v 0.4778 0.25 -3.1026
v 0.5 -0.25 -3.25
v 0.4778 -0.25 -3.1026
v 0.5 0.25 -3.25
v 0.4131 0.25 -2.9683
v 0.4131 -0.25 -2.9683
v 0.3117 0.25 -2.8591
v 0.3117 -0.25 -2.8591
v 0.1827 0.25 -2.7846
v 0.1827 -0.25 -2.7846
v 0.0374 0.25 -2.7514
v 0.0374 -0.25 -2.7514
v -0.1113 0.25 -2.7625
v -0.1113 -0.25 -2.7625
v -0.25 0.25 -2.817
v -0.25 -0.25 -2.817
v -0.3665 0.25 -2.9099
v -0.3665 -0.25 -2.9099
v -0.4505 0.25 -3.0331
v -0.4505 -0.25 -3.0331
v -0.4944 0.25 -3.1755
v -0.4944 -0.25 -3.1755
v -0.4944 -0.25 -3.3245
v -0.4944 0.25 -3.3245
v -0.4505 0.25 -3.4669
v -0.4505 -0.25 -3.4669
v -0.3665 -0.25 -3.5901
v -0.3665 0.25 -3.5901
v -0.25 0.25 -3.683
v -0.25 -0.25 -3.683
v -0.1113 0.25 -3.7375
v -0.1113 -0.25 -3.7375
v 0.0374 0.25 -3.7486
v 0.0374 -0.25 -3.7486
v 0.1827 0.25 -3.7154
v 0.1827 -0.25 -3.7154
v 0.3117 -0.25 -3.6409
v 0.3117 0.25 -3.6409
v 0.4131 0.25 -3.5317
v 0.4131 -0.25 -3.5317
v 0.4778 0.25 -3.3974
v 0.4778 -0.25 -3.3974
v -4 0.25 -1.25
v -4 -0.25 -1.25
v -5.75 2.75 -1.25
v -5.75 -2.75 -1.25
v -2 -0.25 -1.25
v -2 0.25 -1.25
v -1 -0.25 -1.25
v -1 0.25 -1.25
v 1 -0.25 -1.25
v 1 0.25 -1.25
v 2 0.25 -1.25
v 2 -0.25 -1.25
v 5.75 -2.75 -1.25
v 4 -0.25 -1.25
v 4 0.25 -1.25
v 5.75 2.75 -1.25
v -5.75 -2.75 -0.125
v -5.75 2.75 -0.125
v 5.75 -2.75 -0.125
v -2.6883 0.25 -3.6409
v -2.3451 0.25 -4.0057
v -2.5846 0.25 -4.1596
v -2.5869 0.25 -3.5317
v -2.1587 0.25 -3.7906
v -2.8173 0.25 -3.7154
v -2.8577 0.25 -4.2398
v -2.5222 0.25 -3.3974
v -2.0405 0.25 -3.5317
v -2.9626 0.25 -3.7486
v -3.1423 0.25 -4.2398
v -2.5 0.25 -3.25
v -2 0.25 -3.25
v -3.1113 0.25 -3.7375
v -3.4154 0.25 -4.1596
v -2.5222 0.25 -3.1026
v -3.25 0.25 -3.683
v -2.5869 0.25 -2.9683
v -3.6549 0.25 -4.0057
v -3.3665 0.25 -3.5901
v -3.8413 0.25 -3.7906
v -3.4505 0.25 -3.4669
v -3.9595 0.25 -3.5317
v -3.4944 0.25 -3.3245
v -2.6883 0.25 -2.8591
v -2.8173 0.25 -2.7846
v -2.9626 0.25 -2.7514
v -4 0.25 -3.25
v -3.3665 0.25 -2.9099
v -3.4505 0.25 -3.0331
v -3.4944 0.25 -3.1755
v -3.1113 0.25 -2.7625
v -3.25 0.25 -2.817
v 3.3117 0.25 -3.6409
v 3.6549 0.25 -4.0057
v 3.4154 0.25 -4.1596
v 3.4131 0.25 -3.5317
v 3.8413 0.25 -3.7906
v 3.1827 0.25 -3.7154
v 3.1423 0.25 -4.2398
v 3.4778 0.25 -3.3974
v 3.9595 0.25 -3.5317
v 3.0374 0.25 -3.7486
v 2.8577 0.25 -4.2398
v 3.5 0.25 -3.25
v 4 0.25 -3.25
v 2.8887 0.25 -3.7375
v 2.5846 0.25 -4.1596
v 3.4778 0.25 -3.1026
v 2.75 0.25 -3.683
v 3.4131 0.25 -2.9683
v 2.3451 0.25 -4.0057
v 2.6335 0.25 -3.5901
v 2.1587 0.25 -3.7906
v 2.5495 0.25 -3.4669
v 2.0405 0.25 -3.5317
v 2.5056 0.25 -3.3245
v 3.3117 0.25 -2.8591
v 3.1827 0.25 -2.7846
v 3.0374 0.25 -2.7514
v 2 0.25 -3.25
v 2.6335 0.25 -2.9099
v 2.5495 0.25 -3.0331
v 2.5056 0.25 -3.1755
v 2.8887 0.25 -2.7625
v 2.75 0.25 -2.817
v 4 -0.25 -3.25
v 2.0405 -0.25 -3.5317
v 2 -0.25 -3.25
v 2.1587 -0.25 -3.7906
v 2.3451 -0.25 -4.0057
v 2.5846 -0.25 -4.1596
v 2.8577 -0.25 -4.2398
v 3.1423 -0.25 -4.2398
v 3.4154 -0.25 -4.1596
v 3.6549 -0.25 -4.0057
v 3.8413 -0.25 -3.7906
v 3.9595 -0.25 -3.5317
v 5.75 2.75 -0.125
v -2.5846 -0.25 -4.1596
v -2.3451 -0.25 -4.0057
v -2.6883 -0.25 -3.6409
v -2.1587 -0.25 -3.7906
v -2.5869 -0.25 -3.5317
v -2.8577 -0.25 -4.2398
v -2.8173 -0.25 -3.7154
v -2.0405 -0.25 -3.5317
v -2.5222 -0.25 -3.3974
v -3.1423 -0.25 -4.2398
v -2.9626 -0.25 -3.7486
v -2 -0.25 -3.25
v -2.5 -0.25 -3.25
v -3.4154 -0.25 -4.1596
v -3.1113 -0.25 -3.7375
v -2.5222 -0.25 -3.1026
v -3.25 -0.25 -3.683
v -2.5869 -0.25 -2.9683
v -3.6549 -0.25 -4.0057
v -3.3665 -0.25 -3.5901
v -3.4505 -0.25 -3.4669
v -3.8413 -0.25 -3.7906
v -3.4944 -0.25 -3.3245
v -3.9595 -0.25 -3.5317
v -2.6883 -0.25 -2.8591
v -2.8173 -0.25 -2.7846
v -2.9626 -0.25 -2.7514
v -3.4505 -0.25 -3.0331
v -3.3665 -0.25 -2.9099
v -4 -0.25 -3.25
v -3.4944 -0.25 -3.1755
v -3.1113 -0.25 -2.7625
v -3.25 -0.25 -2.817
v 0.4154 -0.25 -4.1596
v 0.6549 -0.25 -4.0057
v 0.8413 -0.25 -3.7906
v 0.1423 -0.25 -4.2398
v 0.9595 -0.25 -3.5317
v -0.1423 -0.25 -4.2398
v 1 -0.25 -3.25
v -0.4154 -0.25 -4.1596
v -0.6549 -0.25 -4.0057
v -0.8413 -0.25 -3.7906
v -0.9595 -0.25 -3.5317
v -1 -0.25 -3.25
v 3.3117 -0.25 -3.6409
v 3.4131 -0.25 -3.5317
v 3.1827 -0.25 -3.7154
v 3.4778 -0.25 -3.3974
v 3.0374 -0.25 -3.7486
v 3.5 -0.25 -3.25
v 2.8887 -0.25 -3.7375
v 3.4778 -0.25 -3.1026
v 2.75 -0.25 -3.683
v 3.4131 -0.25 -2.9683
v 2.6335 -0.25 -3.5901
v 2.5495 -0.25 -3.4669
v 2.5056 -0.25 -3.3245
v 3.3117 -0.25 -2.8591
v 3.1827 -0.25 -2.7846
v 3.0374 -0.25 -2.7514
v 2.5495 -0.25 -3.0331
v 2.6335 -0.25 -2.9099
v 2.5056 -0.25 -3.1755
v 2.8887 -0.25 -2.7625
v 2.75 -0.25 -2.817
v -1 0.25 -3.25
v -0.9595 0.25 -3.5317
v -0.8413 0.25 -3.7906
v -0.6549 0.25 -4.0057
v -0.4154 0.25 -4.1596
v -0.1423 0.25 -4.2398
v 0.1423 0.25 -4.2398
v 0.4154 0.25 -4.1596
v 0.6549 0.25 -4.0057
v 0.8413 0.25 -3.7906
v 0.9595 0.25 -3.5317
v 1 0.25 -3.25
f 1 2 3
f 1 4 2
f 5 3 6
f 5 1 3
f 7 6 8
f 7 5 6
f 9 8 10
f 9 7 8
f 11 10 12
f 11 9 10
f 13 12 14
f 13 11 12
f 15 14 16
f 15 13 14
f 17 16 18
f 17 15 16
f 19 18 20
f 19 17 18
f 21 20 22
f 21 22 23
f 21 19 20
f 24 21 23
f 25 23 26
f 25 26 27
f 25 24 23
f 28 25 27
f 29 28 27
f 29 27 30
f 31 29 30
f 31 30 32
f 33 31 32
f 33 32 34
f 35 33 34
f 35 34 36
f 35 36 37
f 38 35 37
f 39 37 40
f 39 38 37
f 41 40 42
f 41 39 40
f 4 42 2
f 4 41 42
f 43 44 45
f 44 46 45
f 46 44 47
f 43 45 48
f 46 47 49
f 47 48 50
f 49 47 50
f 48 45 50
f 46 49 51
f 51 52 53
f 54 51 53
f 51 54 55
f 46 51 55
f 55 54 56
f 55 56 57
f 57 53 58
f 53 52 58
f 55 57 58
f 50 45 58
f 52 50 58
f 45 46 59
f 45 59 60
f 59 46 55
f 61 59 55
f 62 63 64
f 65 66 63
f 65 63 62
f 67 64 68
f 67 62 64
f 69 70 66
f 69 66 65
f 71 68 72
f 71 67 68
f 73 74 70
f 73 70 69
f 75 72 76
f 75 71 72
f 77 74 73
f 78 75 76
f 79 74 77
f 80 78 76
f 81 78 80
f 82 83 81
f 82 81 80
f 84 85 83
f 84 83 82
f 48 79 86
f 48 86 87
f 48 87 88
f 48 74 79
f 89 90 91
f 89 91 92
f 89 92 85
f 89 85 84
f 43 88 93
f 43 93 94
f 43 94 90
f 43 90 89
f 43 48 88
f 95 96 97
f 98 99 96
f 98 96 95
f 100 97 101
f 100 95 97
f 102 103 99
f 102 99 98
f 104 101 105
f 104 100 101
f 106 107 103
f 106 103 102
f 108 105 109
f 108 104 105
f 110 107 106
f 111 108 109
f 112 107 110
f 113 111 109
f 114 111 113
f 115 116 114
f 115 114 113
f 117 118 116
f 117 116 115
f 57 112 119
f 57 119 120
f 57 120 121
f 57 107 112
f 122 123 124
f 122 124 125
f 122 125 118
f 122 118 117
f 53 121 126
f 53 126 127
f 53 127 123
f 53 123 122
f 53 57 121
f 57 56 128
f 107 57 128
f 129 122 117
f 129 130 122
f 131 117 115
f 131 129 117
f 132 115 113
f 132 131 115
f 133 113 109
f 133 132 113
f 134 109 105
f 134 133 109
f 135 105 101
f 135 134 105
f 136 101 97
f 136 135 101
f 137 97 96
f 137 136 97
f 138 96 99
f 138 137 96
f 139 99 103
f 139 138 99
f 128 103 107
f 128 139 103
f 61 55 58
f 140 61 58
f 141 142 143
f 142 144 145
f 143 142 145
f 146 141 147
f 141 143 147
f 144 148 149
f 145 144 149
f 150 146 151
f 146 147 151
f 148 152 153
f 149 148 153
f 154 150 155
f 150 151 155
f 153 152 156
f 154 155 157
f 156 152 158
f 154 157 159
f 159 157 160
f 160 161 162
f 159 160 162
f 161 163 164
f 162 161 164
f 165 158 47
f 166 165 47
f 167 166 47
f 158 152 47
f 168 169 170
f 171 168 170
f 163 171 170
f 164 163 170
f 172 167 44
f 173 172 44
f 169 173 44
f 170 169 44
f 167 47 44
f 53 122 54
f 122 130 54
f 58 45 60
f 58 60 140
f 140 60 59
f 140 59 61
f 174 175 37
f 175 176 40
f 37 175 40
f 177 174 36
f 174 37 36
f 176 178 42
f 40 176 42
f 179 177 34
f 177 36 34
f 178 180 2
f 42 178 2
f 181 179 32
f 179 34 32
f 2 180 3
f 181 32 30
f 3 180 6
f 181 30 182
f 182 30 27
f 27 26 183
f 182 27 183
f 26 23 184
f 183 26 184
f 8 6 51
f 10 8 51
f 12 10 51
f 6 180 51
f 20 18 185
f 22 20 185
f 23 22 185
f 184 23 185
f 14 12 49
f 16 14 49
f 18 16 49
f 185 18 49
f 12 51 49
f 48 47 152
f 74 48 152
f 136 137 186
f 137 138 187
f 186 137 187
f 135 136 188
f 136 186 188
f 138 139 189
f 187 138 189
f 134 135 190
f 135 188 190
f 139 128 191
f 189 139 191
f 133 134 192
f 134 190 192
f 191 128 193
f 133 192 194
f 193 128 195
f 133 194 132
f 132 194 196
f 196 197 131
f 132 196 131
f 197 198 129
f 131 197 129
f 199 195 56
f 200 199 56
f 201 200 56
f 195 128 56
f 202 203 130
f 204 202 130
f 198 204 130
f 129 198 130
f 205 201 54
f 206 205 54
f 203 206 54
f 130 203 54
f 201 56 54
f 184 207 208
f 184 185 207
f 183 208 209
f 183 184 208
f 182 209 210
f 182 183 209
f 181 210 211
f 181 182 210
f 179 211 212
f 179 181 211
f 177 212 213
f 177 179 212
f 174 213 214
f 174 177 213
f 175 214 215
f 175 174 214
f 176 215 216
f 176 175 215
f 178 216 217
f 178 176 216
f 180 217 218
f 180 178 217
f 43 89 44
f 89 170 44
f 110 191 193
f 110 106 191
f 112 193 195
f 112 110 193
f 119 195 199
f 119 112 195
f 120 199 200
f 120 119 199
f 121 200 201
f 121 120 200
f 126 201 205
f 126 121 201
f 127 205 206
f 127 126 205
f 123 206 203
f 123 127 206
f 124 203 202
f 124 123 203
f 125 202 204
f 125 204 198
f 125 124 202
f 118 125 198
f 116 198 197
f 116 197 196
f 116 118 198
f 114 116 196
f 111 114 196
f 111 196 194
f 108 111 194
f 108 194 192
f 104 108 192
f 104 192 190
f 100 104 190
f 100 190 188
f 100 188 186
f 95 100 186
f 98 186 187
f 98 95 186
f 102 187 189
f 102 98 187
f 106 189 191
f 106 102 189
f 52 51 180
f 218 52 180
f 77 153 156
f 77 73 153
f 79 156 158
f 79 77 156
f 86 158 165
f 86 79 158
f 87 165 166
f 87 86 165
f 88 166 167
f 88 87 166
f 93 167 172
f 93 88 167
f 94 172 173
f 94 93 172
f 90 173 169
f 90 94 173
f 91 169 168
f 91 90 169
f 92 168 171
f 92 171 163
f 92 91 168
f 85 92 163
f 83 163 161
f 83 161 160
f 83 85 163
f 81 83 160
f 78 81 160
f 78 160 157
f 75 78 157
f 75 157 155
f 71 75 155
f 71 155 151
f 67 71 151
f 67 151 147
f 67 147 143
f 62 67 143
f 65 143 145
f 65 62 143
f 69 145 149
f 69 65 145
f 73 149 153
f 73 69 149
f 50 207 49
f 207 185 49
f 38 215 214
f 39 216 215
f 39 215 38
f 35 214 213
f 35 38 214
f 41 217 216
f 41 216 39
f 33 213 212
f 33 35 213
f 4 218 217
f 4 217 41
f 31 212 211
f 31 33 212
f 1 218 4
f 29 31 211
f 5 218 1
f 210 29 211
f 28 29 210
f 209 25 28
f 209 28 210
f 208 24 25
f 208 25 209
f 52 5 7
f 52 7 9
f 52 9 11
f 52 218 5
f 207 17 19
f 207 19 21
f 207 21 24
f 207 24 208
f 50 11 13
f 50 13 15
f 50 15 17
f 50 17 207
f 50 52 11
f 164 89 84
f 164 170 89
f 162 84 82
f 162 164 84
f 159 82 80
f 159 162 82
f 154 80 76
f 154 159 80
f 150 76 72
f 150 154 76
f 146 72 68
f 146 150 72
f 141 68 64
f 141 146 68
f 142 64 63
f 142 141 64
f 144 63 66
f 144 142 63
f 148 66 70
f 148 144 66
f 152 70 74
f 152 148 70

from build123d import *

# Parameters (mm, degrees)
SKETCH006_R  = 0.5
PAD003_DEPTH = 0.25
BOX_W        = 11.5
BOX_H        = 5.5
BOX_DEPTH    = 1.125


with BuildPart() as pin_pad:
    # Sketch006 → Pad003 (new body, symmetric)
    with BuildSketch(Plane.XZ):
        with BuildLine():
            Line((1, -1.25), (1, -3.25))
            ThreePointArc((-1, -3.25), (0, -4.25), (1, -3.25))
            Line((-1, -3.25), (-1, -1.25))
            Line((-1, -1.25), (1, -1.25))
        make_face()
        with Locations((0, -3.25)):
            Circle(SKETCH006_R, mode=Mode.SUBTRACT)
    extrude(amount=PAD003_DEPTH, both=True)


with BuildPart() as pin_right:
    # Clone base: copy of pin-pad
    add(pin_pad.part)


with BuildPart() as pin_right_1:
    # Clone placement: moved
    add(pin_right.part.moved(Location((3, 0, 0))))


with BuildPart() as pin_left:
    # Clone001 base: copy of pin-pad
    add(pin_pad.part)


with BuildPart() as pin_left_1:
    # Clone001 placement: moved
    add(pin_left.part.moved(Location((-3, 0, 0))))


with BuildPart() as board_cube:
    # Box → Box (new body)
    with BuildSketch(Plane(origin=(-5.75, -2.75, -1.25), x_dir=(1, 0, 0), z_dir=(0, 0, 1))):
        with Locations((5.75, 2.75)):
            Rectangle(BOX_W, BOX_H)
    extrude(amount=BOX_DEPTH)


with BuildPart() as slide_switch_board:
    # Fusion base: copy of pin-pad
    add(pin_pad.part)

    # Fusion: union pin-right, pin-left, board-cube
    add(pin_right_1.part)
    add(pin_left_1.part)
    add(board_cube.part)


solid = slide_switch_board.part
